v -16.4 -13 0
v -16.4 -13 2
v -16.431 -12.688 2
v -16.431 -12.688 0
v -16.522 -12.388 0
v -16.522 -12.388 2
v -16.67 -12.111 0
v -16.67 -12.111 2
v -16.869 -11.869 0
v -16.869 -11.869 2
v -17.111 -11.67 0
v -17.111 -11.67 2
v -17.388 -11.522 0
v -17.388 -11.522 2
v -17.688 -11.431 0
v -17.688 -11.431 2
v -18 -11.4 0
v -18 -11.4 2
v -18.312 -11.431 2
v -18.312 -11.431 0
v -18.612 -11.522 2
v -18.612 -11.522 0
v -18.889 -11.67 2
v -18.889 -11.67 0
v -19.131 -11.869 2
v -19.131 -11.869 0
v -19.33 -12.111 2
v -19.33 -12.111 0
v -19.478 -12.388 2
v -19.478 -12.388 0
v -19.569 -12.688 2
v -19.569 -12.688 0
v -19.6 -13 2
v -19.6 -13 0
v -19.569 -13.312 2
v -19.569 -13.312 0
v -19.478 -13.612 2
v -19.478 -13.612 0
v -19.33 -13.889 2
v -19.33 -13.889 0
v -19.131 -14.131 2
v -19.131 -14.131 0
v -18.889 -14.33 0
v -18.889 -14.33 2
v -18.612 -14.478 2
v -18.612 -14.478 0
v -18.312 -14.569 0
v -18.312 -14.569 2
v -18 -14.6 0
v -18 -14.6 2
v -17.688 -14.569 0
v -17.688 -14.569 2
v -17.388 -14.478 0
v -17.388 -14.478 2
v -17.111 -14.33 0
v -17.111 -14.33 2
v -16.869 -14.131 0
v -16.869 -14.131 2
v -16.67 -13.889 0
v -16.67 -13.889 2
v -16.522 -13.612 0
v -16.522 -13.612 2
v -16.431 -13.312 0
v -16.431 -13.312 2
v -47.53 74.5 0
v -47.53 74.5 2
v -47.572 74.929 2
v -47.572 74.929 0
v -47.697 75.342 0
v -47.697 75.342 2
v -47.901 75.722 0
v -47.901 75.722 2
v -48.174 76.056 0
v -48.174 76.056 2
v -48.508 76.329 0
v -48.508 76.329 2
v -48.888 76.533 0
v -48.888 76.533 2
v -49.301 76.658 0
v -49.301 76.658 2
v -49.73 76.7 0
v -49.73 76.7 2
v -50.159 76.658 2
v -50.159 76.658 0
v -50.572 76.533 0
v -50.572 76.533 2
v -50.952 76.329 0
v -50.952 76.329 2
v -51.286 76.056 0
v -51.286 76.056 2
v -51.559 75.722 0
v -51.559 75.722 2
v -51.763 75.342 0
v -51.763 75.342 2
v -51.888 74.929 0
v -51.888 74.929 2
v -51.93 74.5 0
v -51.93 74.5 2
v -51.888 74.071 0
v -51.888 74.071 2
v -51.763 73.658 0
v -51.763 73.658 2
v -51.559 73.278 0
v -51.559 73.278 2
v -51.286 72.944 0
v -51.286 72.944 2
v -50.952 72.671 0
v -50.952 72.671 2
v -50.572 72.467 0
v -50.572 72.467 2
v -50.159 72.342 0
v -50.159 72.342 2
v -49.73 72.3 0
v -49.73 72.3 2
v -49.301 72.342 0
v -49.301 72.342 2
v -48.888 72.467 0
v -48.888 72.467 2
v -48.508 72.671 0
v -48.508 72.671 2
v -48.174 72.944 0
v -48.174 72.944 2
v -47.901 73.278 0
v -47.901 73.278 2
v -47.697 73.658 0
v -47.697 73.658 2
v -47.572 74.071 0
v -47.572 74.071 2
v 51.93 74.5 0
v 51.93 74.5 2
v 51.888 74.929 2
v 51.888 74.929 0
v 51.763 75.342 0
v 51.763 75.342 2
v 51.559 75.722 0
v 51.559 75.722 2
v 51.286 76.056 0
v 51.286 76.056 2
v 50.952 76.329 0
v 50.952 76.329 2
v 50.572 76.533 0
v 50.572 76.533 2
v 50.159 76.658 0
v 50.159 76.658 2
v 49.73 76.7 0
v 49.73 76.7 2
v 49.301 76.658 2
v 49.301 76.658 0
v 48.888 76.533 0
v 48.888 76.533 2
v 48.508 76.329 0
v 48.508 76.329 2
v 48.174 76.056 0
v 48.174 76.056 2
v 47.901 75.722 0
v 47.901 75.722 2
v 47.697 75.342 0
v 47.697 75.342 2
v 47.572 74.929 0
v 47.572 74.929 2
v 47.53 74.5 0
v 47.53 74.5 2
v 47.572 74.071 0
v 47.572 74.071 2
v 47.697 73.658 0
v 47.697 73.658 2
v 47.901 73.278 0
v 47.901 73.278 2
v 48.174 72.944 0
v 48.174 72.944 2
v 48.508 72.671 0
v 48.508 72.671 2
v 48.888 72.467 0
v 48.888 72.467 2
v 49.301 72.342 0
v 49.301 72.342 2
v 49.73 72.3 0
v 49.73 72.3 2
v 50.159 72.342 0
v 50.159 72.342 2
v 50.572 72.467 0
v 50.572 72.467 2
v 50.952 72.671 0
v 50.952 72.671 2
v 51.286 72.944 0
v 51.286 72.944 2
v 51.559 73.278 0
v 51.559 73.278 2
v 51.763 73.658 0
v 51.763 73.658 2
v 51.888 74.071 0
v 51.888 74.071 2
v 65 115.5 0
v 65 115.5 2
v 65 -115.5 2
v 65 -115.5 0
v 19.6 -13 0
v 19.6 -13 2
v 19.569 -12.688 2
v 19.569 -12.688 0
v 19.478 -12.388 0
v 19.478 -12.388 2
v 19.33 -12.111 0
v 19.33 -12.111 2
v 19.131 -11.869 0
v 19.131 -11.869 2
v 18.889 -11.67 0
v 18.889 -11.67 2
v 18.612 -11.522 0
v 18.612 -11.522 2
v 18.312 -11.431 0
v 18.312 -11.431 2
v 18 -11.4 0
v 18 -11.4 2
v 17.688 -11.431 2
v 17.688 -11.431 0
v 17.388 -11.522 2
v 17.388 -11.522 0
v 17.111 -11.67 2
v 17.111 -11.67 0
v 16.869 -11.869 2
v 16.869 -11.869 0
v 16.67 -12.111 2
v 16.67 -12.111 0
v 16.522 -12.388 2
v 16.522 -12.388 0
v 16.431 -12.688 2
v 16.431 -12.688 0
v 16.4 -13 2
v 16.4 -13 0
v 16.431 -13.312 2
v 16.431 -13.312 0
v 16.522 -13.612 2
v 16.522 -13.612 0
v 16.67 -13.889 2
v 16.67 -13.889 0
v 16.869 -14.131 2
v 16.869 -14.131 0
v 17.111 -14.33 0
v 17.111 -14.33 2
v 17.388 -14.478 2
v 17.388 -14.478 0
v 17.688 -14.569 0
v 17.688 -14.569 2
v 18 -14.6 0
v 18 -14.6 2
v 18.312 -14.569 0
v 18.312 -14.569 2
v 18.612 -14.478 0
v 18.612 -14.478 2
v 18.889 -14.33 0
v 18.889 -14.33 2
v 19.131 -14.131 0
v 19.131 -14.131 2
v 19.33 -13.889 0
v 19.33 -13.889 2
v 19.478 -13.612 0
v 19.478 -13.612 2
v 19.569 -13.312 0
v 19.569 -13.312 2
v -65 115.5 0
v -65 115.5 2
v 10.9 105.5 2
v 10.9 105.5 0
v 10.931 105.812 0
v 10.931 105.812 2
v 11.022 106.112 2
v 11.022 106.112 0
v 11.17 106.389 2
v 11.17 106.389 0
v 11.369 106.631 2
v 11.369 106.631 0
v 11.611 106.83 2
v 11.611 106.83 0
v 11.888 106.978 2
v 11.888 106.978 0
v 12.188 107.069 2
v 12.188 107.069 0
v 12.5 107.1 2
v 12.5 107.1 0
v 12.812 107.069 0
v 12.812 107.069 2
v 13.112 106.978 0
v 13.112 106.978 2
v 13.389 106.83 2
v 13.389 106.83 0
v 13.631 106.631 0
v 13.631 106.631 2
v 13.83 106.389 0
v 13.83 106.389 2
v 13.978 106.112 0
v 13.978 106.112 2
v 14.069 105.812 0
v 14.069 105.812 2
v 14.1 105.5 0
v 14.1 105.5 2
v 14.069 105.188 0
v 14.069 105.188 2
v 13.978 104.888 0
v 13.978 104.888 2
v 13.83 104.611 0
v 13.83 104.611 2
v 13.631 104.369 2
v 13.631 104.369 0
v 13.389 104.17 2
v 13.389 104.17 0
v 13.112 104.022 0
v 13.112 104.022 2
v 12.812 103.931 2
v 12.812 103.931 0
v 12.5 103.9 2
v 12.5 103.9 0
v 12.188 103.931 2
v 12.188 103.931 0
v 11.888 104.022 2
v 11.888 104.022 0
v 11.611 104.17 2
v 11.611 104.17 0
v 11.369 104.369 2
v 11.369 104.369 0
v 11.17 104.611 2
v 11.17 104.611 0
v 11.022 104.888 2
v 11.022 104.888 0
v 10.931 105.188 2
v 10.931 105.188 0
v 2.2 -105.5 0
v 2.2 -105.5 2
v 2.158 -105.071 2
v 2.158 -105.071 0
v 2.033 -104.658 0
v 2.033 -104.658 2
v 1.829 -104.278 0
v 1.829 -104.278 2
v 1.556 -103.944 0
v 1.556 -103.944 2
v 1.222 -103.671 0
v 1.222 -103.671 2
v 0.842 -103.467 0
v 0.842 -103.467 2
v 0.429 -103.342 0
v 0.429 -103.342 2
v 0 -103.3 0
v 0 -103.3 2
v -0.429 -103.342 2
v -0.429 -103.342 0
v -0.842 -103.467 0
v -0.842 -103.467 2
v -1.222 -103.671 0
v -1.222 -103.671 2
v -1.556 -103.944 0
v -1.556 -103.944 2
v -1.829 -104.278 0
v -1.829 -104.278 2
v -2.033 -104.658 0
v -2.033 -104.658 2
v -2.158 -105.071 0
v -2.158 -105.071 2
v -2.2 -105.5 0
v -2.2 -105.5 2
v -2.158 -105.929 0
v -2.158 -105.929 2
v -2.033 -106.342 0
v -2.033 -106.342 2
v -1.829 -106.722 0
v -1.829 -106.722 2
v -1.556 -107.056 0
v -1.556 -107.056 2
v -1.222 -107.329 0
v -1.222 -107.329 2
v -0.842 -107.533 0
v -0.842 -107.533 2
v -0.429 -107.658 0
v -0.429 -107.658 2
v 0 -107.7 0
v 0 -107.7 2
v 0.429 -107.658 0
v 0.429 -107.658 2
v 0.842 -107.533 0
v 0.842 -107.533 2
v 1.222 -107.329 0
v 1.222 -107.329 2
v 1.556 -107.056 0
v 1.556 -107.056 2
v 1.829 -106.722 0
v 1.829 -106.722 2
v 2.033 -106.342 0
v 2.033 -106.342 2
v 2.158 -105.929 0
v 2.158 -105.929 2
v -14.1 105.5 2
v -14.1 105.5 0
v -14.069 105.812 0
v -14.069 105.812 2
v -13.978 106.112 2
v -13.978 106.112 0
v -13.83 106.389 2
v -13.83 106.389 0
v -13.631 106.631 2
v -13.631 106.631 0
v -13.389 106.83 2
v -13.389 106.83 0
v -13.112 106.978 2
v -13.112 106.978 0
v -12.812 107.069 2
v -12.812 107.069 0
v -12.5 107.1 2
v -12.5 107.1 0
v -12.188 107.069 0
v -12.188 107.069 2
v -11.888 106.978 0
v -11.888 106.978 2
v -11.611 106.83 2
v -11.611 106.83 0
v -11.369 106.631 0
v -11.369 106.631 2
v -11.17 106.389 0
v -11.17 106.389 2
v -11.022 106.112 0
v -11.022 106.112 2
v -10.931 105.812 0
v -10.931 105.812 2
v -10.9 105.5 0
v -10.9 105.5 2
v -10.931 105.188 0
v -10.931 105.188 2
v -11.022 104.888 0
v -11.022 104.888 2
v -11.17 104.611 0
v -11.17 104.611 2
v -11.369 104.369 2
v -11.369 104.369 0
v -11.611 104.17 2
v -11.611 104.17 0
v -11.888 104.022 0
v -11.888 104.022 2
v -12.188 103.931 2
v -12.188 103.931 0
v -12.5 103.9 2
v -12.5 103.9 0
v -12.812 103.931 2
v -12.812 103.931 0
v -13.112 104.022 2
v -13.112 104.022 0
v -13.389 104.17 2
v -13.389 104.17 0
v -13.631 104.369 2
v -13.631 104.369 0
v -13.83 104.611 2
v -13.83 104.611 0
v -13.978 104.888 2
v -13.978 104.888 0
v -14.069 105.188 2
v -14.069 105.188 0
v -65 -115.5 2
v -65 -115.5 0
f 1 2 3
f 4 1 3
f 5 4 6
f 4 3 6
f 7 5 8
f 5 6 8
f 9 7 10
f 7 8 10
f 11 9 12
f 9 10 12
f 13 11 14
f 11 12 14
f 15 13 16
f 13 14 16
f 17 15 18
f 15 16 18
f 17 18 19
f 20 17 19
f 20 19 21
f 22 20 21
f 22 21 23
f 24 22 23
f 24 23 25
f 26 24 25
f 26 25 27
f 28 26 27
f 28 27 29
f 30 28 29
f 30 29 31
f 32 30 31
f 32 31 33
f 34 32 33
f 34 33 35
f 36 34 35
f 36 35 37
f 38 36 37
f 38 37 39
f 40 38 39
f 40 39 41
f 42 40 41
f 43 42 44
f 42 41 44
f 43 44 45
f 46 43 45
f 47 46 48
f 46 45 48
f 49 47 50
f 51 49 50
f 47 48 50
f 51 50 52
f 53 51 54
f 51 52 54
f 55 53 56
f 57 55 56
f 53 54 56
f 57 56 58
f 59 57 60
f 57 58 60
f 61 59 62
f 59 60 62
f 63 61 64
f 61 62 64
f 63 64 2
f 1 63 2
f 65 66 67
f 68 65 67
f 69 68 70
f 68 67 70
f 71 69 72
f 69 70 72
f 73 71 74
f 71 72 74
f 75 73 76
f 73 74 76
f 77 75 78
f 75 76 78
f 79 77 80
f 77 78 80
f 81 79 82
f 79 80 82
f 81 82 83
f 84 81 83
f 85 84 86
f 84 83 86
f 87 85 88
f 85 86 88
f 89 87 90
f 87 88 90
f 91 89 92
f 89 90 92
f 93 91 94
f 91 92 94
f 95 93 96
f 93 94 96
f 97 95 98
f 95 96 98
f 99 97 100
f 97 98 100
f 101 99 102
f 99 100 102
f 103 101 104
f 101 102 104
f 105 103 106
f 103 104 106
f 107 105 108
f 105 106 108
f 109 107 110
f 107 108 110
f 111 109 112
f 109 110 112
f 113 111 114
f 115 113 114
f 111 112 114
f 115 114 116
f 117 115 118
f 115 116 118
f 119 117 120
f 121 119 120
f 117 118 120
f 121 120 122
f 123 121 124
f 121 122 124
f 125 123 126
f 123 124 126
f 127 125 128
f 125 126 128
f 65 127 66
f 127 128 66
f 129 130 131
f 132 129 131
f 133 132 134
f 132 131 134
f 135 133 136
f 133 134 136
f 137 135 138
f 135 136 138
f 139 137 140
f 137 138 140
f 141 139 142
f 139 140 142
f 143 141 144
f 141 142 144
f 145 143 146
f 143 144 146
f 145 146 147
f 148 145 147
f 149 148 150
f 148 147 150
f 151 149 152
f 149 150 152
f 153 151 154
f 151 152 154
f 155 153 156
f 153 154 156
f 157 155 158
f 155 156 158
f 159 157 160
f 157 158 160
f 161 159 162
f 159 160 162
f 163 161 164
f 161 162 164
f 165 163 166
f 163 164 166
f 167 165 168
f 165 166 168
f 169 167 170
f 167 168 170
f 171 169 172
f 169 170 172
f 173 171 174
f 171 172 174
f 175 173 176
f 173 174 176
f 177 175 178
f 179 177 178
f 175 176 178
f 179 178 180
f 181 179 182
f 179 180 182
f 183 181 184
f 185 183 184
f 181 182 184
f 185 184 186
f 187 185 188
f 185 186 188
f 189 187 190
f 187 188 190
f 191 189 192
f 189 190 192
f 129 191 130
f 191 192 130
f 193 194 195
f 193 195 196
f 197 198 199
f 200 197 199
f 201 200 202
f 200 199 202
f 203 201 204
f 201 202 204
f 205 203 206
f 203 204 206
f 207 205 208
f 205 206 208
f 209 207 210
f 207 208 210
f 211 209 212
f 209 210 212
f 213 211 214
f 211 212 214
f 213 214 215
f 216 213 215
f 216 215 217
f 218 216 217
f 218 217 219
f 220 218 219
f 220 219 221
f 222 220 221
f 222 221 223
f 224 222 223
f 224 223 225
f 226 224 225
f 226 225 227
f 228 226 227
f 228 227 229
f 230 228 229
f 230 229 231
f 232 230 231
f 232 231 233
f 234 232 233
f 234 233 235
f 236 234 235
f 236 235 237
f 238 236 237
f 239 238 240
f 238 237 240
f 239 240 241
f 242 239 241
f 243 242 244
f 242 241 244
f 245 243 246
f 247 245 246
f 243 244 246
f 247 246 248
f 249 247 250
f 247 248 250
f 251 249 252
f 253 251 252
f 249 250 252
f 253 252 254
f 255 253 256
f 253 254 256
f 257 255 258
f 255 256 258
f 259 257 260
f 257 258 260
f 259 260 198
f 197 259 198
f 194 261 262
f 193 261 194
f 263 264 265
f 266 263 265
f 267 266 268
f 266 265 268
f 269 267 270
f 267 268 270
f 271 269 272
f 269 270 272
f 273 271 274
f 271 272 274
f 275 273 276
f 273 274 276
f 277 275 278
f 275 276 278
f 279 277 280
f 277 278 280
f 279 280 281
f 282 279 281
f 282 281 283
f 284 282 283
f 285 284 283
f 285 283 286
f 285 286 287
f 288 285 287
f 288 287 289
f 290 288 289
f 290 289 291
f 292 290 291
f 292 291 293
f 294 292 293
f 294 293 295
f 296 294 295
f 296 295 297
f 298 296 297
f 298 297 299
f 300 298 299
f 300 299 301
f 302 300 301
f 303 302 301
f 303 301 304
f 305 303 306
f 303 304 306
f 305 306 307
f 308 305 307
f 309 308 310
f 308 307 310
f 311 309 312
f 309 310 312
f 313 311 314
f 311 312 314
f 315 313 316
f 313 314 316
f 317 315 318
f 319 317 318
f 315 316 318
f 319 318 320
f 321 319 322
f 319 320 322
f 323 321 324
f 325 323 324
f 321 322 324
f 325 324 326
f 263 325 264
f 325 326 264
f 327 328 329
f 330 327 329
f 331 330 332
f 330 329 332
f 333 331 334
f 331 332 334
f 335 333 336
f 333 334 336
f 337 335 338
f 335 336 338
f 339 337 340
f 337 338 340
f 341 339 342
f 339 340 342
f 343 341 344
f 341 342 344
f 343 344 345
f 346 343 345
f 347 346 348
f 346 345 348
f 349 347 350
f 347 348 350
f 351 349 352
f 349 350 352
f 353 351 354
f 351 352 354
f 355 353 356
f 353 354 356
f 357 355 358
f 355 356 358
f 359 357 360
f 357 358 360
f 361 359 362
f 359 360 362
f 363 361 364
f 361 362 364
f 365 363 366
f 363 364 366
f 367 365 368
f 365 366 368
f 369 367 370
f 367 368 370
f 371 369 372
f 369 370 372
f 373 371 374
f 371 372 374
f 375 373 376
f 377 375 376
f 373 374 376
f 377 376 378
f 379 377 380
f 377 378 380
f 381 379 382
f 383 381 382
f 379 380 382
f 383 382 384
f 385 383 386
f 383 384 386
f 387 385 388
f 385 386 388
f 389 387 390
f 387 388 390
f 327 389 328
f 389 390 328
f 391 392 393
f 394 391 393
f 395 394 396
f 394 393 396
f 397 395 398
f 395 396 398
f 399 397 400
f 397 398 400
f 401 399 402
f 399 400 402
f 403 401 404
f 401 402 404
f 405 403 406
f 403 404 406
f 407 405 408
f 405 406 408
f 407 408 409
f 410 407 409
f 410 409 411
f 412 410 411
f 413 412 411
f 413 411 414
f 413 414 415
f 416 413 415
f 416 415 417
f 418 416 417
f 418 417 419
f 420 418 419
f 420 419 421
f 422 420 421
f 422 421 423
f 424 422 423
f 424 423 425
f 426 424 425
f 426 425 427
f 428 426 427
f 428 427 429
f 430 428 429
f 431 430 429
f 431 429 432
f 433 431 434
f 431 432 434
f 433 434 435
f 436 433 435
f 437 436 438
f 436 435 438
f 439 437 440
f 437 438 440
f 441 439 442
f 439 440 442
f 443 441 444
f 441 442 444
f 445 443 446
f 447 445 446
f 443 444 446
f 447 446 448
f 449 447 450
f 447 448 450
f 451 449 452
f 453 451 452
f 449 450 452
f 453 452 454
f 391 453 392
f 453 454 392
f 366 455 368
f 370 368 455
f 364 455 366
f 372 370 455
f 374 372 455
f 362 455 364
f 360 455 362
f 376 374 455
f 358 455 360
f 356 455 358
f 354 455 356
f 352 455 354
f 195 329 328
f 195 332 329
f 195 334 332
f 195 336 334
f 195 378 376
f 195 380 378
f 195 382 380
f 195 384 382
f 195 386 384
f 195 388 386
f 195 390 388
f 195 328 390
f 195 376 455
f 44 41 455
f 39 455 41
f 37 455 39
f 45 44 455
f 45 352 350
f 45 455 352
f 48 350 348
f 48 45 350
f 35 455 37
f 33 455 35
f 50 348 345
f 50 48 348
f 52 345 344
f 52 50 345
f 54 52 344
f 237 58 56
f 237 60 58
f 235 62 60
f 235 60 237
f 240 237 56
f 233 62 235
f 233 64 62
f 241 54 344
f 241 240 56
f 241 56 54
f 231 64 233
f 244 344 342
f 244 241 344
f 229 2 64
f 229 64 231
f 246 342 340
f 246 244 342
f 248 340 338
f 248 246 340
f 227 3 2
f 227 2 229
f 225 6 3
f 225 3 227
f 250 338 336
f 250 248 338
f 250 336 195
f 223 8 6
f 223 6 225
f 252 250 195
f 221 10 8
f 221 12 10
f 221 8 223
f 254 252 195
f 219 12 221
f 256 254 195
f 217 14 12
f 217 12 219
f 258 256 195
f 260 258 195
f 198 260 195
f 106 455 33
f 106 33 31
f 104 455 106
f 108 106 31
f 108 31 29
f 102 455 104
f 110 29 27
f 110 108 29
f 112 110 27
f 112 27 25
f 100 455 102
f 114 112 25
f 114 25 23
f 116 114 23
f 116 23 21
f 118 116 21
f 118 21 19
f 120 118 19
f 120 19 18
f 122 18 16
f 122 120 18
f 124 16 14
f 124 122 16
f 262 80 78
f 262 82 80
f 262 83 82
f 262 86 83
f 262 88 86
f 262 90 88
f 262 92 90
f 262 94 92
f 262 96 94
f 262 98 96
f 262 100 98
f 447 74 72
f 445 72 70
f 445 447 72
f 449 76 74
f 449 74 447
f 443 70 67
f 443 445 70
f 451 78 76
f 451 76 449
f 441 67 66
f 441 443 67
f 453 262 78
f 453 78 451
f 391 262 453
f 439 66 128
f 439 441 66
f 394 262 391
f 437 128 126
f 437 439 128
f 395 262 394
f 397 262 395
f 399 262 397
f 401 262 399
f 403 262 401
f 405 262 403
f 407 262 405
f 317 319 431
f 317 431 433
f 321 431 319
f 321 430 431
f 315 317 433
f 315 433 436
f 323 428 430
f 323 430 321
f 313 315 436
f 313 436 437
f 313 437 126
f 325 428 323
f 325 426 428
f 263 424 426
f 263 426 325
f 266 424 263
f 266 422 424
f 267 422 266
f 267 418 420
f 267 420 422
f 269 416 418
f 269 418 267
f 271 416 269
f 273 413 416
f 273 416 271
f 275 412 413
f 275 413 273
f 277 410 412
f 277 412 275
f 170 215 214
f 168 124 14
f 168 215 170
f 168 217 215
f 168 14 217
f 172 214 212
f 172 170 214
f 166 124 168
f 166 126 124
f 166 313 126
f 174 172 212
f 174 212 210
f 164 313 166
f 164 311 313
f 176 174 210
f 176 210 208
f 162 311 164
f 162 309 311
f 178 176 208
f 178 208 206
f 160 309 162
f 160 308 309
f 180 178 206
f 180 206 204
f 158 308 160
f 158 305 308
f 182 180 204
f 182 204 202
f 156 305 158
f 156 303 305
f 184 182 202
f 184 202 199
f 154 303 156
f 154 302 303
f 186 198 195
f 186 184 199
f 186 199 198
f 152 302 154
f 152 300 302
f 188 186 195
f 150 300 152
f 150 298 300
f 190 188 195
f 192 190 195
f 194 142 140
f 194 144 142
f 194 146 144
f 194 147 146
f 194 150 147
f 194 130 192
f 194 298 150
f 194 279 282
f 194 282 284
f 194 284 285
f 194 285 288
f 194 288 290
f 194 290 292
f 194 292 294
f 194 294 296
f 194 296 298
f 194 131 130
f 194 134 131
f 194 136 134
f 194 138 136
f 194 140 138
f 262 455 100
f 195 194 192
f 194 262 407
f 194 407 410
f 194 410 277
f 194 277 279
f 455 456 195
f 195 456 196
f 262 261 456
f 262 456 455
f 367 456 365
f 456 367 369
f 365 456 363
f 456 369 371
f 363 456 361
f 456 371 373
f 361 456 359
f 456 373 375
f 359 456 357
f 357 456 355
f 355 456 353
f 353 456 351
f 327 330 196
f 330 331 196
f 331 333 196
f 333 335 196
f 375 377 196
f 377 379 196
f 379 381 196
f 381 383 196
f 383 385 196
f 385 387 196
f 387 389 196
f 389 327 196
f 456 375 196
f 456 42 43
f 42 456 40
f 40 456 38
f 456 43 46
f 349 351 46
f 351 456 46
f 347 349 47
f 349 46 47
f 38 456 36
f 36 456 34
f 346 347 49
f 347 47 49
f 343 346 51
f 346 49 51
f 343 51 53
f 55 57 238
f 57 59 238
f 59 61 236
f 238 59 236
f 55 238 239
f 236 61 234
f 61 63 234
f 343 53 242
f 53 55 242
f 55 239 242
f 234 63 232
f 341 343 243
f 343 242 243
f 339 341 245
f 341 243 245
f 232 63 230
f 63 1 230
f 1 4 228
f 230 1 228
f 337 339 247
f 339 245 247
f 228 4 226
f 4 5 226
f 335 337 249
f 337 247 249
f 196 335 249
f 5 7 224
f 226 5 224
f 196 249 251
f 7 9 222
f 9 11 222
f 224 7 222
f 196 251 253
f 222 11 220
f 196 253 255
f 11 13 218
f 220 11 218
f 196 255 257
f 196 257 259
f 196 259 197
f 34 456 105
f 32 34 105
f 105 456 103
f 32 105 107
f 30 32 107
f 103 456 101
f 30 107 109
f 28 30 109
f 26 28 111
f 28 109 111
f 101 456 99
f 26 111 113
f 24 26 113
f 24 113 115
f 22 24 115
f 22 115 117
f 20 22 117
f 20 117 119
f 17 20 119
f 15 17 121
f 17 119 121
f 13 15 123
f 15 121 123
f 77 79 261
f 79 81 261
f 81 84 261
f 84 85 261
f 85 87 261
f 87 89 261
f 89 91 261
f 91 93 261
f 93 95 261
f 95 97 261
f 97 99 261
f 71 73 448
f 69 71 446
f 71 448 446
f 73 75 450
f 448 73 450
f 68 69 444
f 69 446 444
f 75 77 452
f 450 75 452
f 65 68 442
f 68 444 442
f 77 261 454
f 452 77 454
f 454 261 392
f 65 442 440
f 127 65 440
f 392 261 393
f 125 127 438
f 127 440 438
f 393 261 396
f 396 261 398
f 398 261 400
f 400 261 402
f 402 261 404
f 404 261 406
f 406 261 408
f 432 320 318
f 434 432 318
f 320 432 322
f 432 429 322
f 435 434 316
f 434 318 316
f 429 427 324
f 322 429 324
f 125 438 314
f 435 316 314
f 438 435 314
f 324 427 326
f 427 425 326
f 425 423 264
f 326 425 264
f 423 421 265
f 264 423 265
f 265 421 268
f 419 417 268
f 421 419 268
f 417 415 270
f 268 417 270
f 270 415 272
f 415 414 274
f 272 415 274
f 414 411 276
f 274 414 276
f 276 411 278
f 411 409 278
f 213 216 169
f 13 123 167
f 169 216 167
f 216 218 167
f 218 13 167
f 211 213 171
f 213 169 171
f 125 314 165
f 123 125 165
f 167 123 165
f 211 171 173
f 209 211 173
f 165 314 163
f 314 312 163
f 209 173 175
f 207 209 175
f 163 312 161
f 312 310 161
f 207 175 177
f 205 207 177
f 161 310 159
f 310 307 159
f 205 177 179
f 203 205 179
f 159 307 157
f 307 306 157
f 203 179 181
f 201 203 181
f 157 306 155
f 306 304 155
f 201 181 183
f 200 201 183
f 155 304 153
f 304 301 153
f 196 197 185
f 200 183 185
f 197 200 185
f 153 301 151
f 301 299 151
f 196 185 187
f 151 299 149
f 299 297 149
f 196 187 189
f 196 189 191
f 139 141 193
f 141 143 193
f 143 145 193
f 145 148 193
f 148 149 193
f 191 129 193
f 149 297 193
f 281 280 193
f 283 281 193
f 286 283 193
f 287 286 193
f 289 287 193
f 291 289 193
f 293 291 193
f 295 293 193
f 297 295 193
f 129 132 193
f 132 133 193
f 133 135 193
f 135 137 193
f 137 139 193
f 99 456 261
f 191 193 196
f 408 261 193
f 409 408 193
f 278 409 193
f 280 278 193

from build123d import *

# Parameters (mm, degrees)
SKETCH_1_W          = 150
SKETCH_1_H          = 231
EXTRUDE_1_DEPTH     = 2
SKETCH_2_R          = 2.2
CUT_EXTRUDE_1_DEPTH = 2
SKETCH_3_R          = 1.6
CUT_EXTRUDE_2_DEPTH = 10
SKETCH_4_W          = 2
SKETCH_4_H          = 231
CUT_EXTRUDE_3_DEPTH = 10
SKETCH_5_W          = 2
SKETCH_5_H          = 231
CUT_EXTRUDE_4_DEPTH = 10
SKETCH_6_R          = 1.6
CUT_EXTRUDE_5_DEPTH = 10


with BuildPart() as part:
    # ｽｹｯﾁ1 → ﾎﾞｽ - 押し出し1 (new body)
    with BuildSketch(Plane.XY):
        Rectangle(SKETCH_1_W, SKETCH_1_H)
    extrude(amount=EXTRUDE_1_DEPTH)

    # ｽｹｯﾁ2 → ｶｯﾄ - 押し出し1 (cut)
    with BuildSketch(Plane.XY.offset(2)):
        with Locations((49.73, 74.5)):
            Circle(SKETCH_2_R)
        with Locations((-49.73, 74.5)):
            Circle(SKETCH_2_R)
        with Locations((0, -105.5)):
            Circle(SKETCH_2_R)
    extrude(amount=-CUT_EXTRUDE_1_DEPTH, mode=Mode.SUBTRACT)

    # ｽｹｯﾁ3 → ｶｯﾄ - 押し出し2 (cut)
    with BuildSketch(Plane.XY.offset(2)):
        with Locations((-18, -13)):
            Circle(SKETCH_3_R)
        with Locations((18, -13)):
            Circle(SKETCH_3_R)
    extrude(amount=-CUT_EXTRUDE_2_DEPTH, mode=Mode.SUBTRACT)

    # ｽｹｯﾁ4 → ｶｯﾄ - 押し出し3 (cut)
    with BuildSketch(Plane.ZY.offset(75)):
        with Locations((1, 0)):
            Rectangle(SKETCH_4_W, SKETCH_4_H)
    extrude(amount=-CUT_EXTRUDE_3_DEPTH, mode=Mode.SUBTRACT)

    # ｽｹｯﾁ5 → ｶｯﾄ - 押し出し4 (cut)
    with BuildSketch(Plane(origin=(75, 0, 0), x_dir=(0, 0, -1), z_dir=(1, 0, 0))):
        with Locations((-1, 0)):
            Rectangle(SKETCH_5_W, SKETCH_5_H)
    extrude(amount=-CUT_EXTRUDE_4_DEPTH, mode=Mode.SUBTRACT)

    # ｽｹｯﾁ6 → ｶｯﾄ - 押し出し5 (cut)
    with BuildSketch(Plane(origin=(0, 0, 0), x_dir=(-1, 0, 0), z_dir=(0, 0, -1))):
        with Locations((-12.5, 105.5)):
            Circle(SKETCH_6_R)
        with Locations((12.5, 105.5)):
            Circle(SKETCH_6_R)
    extrude(amount=-CUT_EXTRUDE_5_DEPTH, mode=Mode.SUBTRACT)


solid = part.part
